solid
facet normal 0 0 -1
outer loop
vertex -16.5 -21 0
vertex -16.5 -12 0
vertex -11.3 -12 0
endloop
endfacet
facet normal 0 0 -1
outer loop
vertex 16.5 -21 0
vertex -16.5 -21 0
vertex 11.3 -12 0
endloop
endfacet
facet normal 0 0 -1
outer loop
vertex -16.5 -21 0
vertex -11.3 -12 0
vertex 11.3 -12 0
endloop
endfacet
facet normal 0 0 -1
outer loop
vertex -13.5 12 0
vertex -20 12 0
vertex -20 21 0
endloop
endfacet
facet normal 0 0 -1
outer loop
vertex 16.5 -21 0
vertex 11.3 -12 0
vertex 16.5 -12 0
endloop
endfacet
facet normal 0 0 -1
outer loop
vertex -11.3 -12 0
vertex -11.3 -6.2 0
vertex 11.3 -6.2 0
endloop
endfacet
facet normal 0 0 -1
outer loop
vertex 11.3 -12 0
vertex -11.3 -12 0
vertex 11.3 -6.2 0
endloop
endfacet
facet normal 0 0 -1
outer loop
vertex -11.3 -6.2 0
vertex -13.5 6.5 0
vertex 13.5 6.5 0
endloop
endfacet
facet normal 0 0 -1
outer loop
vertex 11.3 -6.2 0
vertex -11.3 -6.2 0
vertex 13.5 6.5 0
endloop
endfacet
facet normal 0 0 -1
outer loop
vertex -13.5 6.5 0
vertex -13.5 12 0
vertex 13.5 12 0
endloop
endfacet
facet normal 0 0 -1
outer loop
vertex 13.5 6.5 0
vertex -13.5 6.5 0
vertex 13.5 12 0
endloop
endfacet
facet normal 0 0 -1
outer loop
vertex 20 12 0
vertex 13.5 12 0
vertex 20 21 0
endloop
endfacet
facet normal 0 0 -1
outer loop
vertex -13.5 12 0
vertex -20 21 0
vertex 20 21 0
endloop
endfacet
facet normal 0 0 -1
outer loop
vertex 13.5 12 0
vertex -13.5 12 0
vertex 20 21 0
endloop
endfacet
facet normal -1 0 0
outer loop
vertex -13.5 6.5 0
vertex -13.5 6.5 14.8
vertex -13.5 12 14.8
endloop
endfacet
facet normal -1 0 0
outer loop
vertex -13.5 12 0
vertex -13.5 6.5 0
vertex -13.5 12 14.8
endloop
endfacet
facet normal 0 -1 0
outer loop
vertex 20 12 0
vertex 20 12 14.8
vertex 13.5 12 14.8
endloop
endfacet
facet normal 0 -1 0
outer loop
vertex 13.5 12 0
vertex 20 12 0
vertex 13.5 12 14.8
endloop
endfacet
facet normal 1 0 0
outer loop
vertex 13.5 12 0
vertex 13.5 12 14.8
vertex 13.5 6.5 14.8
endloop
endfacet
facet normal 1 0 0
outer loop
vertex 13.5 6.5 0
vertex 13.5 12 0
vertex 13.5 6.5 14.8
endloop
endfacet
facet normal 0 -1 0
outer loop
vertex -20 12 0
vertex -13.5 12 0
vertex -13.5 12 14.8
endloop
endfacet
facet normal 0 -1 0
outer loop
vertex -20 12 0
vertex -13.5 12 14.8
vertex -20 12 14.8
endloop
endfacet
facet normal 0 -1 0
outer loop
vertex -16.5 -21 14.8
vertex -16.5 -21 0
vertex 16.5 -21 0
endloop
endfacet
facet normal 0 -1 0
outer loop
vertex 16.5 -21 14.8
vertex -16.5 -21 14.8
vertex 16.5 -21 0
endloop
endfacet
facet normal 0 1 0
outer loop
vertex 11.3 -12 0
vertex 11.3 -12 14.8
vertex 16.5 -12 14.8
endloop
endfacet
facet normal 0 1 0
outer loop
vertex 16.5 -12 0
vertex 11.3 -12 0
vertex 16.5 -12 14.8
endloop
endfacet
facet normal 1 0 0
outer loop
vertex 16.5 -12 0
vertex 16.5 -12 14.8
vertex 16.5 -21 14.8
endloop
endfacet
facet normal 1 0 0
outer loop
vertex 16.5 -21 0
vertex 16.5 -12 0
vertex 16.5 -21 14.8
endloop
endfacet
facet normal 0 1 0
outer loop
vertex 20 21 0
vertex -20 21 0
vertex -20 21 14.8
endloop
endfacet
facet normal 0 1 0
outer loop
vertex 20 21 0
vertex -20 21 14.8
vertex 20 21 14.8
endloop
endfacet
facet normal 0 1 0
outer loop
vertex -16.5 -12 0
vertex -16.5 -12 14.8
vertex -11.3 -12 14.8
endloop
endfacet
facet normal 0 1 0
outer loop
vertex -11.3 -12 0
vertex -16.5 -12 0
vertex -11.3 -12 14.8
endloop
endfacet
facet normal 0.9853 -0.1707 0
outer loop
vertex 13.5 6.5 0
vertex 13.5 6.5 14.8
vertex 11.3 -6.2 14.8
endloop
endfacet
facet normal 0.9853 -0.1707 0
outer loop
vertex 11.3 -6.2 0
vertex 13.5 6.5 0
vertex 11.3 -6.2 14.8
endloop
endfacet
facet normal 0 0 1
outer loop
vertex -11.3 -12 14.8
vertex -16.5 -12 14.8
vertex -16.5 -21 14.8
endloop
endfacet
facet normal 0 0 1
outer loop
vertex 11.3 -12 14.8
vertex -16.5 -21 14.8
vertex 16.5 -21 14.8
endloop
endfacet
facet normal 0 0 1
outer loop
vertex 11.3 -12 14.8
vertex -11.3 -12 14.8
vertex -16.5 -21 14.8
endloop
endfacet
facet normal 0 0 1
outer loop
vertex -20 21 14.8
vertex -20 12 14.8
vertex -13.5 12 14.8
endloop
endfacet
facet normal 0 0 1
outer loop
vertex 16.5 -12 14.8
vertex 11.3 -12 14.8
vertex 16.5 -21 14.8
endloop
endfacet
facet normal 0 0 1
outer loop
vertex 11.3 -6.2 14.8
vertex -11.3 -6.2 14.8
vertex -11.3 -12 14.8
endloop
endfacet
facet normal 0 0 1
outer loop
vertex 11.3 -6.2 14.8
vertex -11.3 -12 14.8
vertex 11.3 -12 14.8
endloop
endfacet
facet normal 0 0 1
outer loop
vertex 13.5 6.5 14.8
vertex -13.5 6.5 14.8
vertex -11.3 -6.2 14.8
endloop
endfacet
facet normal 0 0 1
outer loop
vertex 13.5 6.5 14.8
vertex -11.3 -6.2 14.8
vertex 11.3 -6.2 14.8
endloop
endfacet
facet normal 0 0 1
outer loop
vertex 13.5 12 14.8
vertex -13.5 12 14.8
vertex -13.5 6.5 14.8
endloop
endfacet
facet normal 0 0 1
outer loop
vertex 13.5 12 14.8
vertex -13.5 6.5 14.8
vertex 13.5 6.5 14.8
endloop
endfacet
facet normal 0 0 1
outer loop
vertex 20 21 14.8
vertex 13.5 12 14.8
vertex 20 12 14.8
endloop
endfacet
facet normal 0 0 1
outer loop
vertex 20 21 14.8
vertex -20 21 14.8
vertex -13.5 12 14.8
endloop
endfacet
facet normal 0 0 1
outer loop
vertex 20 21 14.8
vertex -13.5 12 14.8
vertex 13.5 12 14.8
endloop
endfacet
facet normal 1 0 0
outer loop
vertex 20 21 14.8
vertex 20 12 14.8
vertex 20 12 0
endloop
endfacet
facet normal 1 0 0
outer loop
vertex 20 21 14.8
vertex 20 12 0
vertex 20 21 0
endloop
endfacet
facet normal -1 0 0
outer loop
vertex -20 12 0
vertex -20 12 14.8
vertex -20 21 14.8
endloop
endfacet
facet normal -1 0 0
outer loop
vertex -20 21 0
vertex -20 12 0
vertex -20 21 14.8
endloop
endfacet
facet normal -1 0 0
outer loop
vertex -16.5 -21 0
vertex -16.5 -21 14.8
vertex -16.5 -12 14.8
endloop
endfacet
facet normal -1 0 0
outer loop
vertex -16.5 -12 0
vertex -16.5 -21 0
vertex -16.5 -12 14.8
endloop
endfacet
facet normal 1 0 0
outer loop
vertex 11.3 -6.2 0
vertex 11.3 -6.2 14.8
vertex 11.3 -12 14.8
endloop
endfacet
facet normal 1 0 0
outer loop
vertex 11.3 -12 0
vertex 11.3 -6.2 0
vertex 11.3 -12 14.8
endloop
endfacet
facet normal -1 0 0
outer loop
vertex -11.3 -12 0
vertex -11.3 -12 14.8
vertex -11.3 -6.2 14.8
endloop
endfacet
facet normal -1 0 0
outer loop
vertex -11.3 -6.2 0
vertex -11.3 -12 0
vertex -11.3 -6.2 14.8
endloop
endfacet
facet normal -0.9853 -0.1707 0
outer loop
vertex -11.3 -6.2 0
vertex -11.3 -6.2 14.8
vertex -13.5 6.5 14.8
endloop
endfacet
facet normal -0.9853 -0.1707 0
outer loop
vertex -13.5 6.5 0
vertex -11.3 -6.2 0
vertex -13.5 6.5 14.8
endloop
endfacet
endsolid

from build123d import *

# Parameters (mm, degrees)
F0_W     = 40
F0_H     = 42
F1_DEPTH = 14.8
F3_DEPTH = 25


with BuildPart() as f1:
    # F0 (on Top) → F1 (new body)
    with BuildSketch(Plane.XY):
        Rectangle(F0_W, F0_H)
    extrude(amount=F1_DEPTH)

    # F2 (on face) → F3 (cut)
    with BuildSketch(Plane.XY.offset(14.8)):
        Polygon((-13.5, 12), (-20, 12), (-20, -21), (-16.5, -21), (-16.5, -12), (-11.3, -12), (-11.3, -6.2), (-13.5, 6.5), align=None)
        Polygon((16.5, -12), (16.5, -21), (20, -21), (20, 12), (13.5, 12), (13.5, 6.5), (11.3, -6.2), (11.3, -12), align=None)
    extrude(amount=-F3_DEPTH, mode=Mode.SUBTRACT)


solid = f1.part
